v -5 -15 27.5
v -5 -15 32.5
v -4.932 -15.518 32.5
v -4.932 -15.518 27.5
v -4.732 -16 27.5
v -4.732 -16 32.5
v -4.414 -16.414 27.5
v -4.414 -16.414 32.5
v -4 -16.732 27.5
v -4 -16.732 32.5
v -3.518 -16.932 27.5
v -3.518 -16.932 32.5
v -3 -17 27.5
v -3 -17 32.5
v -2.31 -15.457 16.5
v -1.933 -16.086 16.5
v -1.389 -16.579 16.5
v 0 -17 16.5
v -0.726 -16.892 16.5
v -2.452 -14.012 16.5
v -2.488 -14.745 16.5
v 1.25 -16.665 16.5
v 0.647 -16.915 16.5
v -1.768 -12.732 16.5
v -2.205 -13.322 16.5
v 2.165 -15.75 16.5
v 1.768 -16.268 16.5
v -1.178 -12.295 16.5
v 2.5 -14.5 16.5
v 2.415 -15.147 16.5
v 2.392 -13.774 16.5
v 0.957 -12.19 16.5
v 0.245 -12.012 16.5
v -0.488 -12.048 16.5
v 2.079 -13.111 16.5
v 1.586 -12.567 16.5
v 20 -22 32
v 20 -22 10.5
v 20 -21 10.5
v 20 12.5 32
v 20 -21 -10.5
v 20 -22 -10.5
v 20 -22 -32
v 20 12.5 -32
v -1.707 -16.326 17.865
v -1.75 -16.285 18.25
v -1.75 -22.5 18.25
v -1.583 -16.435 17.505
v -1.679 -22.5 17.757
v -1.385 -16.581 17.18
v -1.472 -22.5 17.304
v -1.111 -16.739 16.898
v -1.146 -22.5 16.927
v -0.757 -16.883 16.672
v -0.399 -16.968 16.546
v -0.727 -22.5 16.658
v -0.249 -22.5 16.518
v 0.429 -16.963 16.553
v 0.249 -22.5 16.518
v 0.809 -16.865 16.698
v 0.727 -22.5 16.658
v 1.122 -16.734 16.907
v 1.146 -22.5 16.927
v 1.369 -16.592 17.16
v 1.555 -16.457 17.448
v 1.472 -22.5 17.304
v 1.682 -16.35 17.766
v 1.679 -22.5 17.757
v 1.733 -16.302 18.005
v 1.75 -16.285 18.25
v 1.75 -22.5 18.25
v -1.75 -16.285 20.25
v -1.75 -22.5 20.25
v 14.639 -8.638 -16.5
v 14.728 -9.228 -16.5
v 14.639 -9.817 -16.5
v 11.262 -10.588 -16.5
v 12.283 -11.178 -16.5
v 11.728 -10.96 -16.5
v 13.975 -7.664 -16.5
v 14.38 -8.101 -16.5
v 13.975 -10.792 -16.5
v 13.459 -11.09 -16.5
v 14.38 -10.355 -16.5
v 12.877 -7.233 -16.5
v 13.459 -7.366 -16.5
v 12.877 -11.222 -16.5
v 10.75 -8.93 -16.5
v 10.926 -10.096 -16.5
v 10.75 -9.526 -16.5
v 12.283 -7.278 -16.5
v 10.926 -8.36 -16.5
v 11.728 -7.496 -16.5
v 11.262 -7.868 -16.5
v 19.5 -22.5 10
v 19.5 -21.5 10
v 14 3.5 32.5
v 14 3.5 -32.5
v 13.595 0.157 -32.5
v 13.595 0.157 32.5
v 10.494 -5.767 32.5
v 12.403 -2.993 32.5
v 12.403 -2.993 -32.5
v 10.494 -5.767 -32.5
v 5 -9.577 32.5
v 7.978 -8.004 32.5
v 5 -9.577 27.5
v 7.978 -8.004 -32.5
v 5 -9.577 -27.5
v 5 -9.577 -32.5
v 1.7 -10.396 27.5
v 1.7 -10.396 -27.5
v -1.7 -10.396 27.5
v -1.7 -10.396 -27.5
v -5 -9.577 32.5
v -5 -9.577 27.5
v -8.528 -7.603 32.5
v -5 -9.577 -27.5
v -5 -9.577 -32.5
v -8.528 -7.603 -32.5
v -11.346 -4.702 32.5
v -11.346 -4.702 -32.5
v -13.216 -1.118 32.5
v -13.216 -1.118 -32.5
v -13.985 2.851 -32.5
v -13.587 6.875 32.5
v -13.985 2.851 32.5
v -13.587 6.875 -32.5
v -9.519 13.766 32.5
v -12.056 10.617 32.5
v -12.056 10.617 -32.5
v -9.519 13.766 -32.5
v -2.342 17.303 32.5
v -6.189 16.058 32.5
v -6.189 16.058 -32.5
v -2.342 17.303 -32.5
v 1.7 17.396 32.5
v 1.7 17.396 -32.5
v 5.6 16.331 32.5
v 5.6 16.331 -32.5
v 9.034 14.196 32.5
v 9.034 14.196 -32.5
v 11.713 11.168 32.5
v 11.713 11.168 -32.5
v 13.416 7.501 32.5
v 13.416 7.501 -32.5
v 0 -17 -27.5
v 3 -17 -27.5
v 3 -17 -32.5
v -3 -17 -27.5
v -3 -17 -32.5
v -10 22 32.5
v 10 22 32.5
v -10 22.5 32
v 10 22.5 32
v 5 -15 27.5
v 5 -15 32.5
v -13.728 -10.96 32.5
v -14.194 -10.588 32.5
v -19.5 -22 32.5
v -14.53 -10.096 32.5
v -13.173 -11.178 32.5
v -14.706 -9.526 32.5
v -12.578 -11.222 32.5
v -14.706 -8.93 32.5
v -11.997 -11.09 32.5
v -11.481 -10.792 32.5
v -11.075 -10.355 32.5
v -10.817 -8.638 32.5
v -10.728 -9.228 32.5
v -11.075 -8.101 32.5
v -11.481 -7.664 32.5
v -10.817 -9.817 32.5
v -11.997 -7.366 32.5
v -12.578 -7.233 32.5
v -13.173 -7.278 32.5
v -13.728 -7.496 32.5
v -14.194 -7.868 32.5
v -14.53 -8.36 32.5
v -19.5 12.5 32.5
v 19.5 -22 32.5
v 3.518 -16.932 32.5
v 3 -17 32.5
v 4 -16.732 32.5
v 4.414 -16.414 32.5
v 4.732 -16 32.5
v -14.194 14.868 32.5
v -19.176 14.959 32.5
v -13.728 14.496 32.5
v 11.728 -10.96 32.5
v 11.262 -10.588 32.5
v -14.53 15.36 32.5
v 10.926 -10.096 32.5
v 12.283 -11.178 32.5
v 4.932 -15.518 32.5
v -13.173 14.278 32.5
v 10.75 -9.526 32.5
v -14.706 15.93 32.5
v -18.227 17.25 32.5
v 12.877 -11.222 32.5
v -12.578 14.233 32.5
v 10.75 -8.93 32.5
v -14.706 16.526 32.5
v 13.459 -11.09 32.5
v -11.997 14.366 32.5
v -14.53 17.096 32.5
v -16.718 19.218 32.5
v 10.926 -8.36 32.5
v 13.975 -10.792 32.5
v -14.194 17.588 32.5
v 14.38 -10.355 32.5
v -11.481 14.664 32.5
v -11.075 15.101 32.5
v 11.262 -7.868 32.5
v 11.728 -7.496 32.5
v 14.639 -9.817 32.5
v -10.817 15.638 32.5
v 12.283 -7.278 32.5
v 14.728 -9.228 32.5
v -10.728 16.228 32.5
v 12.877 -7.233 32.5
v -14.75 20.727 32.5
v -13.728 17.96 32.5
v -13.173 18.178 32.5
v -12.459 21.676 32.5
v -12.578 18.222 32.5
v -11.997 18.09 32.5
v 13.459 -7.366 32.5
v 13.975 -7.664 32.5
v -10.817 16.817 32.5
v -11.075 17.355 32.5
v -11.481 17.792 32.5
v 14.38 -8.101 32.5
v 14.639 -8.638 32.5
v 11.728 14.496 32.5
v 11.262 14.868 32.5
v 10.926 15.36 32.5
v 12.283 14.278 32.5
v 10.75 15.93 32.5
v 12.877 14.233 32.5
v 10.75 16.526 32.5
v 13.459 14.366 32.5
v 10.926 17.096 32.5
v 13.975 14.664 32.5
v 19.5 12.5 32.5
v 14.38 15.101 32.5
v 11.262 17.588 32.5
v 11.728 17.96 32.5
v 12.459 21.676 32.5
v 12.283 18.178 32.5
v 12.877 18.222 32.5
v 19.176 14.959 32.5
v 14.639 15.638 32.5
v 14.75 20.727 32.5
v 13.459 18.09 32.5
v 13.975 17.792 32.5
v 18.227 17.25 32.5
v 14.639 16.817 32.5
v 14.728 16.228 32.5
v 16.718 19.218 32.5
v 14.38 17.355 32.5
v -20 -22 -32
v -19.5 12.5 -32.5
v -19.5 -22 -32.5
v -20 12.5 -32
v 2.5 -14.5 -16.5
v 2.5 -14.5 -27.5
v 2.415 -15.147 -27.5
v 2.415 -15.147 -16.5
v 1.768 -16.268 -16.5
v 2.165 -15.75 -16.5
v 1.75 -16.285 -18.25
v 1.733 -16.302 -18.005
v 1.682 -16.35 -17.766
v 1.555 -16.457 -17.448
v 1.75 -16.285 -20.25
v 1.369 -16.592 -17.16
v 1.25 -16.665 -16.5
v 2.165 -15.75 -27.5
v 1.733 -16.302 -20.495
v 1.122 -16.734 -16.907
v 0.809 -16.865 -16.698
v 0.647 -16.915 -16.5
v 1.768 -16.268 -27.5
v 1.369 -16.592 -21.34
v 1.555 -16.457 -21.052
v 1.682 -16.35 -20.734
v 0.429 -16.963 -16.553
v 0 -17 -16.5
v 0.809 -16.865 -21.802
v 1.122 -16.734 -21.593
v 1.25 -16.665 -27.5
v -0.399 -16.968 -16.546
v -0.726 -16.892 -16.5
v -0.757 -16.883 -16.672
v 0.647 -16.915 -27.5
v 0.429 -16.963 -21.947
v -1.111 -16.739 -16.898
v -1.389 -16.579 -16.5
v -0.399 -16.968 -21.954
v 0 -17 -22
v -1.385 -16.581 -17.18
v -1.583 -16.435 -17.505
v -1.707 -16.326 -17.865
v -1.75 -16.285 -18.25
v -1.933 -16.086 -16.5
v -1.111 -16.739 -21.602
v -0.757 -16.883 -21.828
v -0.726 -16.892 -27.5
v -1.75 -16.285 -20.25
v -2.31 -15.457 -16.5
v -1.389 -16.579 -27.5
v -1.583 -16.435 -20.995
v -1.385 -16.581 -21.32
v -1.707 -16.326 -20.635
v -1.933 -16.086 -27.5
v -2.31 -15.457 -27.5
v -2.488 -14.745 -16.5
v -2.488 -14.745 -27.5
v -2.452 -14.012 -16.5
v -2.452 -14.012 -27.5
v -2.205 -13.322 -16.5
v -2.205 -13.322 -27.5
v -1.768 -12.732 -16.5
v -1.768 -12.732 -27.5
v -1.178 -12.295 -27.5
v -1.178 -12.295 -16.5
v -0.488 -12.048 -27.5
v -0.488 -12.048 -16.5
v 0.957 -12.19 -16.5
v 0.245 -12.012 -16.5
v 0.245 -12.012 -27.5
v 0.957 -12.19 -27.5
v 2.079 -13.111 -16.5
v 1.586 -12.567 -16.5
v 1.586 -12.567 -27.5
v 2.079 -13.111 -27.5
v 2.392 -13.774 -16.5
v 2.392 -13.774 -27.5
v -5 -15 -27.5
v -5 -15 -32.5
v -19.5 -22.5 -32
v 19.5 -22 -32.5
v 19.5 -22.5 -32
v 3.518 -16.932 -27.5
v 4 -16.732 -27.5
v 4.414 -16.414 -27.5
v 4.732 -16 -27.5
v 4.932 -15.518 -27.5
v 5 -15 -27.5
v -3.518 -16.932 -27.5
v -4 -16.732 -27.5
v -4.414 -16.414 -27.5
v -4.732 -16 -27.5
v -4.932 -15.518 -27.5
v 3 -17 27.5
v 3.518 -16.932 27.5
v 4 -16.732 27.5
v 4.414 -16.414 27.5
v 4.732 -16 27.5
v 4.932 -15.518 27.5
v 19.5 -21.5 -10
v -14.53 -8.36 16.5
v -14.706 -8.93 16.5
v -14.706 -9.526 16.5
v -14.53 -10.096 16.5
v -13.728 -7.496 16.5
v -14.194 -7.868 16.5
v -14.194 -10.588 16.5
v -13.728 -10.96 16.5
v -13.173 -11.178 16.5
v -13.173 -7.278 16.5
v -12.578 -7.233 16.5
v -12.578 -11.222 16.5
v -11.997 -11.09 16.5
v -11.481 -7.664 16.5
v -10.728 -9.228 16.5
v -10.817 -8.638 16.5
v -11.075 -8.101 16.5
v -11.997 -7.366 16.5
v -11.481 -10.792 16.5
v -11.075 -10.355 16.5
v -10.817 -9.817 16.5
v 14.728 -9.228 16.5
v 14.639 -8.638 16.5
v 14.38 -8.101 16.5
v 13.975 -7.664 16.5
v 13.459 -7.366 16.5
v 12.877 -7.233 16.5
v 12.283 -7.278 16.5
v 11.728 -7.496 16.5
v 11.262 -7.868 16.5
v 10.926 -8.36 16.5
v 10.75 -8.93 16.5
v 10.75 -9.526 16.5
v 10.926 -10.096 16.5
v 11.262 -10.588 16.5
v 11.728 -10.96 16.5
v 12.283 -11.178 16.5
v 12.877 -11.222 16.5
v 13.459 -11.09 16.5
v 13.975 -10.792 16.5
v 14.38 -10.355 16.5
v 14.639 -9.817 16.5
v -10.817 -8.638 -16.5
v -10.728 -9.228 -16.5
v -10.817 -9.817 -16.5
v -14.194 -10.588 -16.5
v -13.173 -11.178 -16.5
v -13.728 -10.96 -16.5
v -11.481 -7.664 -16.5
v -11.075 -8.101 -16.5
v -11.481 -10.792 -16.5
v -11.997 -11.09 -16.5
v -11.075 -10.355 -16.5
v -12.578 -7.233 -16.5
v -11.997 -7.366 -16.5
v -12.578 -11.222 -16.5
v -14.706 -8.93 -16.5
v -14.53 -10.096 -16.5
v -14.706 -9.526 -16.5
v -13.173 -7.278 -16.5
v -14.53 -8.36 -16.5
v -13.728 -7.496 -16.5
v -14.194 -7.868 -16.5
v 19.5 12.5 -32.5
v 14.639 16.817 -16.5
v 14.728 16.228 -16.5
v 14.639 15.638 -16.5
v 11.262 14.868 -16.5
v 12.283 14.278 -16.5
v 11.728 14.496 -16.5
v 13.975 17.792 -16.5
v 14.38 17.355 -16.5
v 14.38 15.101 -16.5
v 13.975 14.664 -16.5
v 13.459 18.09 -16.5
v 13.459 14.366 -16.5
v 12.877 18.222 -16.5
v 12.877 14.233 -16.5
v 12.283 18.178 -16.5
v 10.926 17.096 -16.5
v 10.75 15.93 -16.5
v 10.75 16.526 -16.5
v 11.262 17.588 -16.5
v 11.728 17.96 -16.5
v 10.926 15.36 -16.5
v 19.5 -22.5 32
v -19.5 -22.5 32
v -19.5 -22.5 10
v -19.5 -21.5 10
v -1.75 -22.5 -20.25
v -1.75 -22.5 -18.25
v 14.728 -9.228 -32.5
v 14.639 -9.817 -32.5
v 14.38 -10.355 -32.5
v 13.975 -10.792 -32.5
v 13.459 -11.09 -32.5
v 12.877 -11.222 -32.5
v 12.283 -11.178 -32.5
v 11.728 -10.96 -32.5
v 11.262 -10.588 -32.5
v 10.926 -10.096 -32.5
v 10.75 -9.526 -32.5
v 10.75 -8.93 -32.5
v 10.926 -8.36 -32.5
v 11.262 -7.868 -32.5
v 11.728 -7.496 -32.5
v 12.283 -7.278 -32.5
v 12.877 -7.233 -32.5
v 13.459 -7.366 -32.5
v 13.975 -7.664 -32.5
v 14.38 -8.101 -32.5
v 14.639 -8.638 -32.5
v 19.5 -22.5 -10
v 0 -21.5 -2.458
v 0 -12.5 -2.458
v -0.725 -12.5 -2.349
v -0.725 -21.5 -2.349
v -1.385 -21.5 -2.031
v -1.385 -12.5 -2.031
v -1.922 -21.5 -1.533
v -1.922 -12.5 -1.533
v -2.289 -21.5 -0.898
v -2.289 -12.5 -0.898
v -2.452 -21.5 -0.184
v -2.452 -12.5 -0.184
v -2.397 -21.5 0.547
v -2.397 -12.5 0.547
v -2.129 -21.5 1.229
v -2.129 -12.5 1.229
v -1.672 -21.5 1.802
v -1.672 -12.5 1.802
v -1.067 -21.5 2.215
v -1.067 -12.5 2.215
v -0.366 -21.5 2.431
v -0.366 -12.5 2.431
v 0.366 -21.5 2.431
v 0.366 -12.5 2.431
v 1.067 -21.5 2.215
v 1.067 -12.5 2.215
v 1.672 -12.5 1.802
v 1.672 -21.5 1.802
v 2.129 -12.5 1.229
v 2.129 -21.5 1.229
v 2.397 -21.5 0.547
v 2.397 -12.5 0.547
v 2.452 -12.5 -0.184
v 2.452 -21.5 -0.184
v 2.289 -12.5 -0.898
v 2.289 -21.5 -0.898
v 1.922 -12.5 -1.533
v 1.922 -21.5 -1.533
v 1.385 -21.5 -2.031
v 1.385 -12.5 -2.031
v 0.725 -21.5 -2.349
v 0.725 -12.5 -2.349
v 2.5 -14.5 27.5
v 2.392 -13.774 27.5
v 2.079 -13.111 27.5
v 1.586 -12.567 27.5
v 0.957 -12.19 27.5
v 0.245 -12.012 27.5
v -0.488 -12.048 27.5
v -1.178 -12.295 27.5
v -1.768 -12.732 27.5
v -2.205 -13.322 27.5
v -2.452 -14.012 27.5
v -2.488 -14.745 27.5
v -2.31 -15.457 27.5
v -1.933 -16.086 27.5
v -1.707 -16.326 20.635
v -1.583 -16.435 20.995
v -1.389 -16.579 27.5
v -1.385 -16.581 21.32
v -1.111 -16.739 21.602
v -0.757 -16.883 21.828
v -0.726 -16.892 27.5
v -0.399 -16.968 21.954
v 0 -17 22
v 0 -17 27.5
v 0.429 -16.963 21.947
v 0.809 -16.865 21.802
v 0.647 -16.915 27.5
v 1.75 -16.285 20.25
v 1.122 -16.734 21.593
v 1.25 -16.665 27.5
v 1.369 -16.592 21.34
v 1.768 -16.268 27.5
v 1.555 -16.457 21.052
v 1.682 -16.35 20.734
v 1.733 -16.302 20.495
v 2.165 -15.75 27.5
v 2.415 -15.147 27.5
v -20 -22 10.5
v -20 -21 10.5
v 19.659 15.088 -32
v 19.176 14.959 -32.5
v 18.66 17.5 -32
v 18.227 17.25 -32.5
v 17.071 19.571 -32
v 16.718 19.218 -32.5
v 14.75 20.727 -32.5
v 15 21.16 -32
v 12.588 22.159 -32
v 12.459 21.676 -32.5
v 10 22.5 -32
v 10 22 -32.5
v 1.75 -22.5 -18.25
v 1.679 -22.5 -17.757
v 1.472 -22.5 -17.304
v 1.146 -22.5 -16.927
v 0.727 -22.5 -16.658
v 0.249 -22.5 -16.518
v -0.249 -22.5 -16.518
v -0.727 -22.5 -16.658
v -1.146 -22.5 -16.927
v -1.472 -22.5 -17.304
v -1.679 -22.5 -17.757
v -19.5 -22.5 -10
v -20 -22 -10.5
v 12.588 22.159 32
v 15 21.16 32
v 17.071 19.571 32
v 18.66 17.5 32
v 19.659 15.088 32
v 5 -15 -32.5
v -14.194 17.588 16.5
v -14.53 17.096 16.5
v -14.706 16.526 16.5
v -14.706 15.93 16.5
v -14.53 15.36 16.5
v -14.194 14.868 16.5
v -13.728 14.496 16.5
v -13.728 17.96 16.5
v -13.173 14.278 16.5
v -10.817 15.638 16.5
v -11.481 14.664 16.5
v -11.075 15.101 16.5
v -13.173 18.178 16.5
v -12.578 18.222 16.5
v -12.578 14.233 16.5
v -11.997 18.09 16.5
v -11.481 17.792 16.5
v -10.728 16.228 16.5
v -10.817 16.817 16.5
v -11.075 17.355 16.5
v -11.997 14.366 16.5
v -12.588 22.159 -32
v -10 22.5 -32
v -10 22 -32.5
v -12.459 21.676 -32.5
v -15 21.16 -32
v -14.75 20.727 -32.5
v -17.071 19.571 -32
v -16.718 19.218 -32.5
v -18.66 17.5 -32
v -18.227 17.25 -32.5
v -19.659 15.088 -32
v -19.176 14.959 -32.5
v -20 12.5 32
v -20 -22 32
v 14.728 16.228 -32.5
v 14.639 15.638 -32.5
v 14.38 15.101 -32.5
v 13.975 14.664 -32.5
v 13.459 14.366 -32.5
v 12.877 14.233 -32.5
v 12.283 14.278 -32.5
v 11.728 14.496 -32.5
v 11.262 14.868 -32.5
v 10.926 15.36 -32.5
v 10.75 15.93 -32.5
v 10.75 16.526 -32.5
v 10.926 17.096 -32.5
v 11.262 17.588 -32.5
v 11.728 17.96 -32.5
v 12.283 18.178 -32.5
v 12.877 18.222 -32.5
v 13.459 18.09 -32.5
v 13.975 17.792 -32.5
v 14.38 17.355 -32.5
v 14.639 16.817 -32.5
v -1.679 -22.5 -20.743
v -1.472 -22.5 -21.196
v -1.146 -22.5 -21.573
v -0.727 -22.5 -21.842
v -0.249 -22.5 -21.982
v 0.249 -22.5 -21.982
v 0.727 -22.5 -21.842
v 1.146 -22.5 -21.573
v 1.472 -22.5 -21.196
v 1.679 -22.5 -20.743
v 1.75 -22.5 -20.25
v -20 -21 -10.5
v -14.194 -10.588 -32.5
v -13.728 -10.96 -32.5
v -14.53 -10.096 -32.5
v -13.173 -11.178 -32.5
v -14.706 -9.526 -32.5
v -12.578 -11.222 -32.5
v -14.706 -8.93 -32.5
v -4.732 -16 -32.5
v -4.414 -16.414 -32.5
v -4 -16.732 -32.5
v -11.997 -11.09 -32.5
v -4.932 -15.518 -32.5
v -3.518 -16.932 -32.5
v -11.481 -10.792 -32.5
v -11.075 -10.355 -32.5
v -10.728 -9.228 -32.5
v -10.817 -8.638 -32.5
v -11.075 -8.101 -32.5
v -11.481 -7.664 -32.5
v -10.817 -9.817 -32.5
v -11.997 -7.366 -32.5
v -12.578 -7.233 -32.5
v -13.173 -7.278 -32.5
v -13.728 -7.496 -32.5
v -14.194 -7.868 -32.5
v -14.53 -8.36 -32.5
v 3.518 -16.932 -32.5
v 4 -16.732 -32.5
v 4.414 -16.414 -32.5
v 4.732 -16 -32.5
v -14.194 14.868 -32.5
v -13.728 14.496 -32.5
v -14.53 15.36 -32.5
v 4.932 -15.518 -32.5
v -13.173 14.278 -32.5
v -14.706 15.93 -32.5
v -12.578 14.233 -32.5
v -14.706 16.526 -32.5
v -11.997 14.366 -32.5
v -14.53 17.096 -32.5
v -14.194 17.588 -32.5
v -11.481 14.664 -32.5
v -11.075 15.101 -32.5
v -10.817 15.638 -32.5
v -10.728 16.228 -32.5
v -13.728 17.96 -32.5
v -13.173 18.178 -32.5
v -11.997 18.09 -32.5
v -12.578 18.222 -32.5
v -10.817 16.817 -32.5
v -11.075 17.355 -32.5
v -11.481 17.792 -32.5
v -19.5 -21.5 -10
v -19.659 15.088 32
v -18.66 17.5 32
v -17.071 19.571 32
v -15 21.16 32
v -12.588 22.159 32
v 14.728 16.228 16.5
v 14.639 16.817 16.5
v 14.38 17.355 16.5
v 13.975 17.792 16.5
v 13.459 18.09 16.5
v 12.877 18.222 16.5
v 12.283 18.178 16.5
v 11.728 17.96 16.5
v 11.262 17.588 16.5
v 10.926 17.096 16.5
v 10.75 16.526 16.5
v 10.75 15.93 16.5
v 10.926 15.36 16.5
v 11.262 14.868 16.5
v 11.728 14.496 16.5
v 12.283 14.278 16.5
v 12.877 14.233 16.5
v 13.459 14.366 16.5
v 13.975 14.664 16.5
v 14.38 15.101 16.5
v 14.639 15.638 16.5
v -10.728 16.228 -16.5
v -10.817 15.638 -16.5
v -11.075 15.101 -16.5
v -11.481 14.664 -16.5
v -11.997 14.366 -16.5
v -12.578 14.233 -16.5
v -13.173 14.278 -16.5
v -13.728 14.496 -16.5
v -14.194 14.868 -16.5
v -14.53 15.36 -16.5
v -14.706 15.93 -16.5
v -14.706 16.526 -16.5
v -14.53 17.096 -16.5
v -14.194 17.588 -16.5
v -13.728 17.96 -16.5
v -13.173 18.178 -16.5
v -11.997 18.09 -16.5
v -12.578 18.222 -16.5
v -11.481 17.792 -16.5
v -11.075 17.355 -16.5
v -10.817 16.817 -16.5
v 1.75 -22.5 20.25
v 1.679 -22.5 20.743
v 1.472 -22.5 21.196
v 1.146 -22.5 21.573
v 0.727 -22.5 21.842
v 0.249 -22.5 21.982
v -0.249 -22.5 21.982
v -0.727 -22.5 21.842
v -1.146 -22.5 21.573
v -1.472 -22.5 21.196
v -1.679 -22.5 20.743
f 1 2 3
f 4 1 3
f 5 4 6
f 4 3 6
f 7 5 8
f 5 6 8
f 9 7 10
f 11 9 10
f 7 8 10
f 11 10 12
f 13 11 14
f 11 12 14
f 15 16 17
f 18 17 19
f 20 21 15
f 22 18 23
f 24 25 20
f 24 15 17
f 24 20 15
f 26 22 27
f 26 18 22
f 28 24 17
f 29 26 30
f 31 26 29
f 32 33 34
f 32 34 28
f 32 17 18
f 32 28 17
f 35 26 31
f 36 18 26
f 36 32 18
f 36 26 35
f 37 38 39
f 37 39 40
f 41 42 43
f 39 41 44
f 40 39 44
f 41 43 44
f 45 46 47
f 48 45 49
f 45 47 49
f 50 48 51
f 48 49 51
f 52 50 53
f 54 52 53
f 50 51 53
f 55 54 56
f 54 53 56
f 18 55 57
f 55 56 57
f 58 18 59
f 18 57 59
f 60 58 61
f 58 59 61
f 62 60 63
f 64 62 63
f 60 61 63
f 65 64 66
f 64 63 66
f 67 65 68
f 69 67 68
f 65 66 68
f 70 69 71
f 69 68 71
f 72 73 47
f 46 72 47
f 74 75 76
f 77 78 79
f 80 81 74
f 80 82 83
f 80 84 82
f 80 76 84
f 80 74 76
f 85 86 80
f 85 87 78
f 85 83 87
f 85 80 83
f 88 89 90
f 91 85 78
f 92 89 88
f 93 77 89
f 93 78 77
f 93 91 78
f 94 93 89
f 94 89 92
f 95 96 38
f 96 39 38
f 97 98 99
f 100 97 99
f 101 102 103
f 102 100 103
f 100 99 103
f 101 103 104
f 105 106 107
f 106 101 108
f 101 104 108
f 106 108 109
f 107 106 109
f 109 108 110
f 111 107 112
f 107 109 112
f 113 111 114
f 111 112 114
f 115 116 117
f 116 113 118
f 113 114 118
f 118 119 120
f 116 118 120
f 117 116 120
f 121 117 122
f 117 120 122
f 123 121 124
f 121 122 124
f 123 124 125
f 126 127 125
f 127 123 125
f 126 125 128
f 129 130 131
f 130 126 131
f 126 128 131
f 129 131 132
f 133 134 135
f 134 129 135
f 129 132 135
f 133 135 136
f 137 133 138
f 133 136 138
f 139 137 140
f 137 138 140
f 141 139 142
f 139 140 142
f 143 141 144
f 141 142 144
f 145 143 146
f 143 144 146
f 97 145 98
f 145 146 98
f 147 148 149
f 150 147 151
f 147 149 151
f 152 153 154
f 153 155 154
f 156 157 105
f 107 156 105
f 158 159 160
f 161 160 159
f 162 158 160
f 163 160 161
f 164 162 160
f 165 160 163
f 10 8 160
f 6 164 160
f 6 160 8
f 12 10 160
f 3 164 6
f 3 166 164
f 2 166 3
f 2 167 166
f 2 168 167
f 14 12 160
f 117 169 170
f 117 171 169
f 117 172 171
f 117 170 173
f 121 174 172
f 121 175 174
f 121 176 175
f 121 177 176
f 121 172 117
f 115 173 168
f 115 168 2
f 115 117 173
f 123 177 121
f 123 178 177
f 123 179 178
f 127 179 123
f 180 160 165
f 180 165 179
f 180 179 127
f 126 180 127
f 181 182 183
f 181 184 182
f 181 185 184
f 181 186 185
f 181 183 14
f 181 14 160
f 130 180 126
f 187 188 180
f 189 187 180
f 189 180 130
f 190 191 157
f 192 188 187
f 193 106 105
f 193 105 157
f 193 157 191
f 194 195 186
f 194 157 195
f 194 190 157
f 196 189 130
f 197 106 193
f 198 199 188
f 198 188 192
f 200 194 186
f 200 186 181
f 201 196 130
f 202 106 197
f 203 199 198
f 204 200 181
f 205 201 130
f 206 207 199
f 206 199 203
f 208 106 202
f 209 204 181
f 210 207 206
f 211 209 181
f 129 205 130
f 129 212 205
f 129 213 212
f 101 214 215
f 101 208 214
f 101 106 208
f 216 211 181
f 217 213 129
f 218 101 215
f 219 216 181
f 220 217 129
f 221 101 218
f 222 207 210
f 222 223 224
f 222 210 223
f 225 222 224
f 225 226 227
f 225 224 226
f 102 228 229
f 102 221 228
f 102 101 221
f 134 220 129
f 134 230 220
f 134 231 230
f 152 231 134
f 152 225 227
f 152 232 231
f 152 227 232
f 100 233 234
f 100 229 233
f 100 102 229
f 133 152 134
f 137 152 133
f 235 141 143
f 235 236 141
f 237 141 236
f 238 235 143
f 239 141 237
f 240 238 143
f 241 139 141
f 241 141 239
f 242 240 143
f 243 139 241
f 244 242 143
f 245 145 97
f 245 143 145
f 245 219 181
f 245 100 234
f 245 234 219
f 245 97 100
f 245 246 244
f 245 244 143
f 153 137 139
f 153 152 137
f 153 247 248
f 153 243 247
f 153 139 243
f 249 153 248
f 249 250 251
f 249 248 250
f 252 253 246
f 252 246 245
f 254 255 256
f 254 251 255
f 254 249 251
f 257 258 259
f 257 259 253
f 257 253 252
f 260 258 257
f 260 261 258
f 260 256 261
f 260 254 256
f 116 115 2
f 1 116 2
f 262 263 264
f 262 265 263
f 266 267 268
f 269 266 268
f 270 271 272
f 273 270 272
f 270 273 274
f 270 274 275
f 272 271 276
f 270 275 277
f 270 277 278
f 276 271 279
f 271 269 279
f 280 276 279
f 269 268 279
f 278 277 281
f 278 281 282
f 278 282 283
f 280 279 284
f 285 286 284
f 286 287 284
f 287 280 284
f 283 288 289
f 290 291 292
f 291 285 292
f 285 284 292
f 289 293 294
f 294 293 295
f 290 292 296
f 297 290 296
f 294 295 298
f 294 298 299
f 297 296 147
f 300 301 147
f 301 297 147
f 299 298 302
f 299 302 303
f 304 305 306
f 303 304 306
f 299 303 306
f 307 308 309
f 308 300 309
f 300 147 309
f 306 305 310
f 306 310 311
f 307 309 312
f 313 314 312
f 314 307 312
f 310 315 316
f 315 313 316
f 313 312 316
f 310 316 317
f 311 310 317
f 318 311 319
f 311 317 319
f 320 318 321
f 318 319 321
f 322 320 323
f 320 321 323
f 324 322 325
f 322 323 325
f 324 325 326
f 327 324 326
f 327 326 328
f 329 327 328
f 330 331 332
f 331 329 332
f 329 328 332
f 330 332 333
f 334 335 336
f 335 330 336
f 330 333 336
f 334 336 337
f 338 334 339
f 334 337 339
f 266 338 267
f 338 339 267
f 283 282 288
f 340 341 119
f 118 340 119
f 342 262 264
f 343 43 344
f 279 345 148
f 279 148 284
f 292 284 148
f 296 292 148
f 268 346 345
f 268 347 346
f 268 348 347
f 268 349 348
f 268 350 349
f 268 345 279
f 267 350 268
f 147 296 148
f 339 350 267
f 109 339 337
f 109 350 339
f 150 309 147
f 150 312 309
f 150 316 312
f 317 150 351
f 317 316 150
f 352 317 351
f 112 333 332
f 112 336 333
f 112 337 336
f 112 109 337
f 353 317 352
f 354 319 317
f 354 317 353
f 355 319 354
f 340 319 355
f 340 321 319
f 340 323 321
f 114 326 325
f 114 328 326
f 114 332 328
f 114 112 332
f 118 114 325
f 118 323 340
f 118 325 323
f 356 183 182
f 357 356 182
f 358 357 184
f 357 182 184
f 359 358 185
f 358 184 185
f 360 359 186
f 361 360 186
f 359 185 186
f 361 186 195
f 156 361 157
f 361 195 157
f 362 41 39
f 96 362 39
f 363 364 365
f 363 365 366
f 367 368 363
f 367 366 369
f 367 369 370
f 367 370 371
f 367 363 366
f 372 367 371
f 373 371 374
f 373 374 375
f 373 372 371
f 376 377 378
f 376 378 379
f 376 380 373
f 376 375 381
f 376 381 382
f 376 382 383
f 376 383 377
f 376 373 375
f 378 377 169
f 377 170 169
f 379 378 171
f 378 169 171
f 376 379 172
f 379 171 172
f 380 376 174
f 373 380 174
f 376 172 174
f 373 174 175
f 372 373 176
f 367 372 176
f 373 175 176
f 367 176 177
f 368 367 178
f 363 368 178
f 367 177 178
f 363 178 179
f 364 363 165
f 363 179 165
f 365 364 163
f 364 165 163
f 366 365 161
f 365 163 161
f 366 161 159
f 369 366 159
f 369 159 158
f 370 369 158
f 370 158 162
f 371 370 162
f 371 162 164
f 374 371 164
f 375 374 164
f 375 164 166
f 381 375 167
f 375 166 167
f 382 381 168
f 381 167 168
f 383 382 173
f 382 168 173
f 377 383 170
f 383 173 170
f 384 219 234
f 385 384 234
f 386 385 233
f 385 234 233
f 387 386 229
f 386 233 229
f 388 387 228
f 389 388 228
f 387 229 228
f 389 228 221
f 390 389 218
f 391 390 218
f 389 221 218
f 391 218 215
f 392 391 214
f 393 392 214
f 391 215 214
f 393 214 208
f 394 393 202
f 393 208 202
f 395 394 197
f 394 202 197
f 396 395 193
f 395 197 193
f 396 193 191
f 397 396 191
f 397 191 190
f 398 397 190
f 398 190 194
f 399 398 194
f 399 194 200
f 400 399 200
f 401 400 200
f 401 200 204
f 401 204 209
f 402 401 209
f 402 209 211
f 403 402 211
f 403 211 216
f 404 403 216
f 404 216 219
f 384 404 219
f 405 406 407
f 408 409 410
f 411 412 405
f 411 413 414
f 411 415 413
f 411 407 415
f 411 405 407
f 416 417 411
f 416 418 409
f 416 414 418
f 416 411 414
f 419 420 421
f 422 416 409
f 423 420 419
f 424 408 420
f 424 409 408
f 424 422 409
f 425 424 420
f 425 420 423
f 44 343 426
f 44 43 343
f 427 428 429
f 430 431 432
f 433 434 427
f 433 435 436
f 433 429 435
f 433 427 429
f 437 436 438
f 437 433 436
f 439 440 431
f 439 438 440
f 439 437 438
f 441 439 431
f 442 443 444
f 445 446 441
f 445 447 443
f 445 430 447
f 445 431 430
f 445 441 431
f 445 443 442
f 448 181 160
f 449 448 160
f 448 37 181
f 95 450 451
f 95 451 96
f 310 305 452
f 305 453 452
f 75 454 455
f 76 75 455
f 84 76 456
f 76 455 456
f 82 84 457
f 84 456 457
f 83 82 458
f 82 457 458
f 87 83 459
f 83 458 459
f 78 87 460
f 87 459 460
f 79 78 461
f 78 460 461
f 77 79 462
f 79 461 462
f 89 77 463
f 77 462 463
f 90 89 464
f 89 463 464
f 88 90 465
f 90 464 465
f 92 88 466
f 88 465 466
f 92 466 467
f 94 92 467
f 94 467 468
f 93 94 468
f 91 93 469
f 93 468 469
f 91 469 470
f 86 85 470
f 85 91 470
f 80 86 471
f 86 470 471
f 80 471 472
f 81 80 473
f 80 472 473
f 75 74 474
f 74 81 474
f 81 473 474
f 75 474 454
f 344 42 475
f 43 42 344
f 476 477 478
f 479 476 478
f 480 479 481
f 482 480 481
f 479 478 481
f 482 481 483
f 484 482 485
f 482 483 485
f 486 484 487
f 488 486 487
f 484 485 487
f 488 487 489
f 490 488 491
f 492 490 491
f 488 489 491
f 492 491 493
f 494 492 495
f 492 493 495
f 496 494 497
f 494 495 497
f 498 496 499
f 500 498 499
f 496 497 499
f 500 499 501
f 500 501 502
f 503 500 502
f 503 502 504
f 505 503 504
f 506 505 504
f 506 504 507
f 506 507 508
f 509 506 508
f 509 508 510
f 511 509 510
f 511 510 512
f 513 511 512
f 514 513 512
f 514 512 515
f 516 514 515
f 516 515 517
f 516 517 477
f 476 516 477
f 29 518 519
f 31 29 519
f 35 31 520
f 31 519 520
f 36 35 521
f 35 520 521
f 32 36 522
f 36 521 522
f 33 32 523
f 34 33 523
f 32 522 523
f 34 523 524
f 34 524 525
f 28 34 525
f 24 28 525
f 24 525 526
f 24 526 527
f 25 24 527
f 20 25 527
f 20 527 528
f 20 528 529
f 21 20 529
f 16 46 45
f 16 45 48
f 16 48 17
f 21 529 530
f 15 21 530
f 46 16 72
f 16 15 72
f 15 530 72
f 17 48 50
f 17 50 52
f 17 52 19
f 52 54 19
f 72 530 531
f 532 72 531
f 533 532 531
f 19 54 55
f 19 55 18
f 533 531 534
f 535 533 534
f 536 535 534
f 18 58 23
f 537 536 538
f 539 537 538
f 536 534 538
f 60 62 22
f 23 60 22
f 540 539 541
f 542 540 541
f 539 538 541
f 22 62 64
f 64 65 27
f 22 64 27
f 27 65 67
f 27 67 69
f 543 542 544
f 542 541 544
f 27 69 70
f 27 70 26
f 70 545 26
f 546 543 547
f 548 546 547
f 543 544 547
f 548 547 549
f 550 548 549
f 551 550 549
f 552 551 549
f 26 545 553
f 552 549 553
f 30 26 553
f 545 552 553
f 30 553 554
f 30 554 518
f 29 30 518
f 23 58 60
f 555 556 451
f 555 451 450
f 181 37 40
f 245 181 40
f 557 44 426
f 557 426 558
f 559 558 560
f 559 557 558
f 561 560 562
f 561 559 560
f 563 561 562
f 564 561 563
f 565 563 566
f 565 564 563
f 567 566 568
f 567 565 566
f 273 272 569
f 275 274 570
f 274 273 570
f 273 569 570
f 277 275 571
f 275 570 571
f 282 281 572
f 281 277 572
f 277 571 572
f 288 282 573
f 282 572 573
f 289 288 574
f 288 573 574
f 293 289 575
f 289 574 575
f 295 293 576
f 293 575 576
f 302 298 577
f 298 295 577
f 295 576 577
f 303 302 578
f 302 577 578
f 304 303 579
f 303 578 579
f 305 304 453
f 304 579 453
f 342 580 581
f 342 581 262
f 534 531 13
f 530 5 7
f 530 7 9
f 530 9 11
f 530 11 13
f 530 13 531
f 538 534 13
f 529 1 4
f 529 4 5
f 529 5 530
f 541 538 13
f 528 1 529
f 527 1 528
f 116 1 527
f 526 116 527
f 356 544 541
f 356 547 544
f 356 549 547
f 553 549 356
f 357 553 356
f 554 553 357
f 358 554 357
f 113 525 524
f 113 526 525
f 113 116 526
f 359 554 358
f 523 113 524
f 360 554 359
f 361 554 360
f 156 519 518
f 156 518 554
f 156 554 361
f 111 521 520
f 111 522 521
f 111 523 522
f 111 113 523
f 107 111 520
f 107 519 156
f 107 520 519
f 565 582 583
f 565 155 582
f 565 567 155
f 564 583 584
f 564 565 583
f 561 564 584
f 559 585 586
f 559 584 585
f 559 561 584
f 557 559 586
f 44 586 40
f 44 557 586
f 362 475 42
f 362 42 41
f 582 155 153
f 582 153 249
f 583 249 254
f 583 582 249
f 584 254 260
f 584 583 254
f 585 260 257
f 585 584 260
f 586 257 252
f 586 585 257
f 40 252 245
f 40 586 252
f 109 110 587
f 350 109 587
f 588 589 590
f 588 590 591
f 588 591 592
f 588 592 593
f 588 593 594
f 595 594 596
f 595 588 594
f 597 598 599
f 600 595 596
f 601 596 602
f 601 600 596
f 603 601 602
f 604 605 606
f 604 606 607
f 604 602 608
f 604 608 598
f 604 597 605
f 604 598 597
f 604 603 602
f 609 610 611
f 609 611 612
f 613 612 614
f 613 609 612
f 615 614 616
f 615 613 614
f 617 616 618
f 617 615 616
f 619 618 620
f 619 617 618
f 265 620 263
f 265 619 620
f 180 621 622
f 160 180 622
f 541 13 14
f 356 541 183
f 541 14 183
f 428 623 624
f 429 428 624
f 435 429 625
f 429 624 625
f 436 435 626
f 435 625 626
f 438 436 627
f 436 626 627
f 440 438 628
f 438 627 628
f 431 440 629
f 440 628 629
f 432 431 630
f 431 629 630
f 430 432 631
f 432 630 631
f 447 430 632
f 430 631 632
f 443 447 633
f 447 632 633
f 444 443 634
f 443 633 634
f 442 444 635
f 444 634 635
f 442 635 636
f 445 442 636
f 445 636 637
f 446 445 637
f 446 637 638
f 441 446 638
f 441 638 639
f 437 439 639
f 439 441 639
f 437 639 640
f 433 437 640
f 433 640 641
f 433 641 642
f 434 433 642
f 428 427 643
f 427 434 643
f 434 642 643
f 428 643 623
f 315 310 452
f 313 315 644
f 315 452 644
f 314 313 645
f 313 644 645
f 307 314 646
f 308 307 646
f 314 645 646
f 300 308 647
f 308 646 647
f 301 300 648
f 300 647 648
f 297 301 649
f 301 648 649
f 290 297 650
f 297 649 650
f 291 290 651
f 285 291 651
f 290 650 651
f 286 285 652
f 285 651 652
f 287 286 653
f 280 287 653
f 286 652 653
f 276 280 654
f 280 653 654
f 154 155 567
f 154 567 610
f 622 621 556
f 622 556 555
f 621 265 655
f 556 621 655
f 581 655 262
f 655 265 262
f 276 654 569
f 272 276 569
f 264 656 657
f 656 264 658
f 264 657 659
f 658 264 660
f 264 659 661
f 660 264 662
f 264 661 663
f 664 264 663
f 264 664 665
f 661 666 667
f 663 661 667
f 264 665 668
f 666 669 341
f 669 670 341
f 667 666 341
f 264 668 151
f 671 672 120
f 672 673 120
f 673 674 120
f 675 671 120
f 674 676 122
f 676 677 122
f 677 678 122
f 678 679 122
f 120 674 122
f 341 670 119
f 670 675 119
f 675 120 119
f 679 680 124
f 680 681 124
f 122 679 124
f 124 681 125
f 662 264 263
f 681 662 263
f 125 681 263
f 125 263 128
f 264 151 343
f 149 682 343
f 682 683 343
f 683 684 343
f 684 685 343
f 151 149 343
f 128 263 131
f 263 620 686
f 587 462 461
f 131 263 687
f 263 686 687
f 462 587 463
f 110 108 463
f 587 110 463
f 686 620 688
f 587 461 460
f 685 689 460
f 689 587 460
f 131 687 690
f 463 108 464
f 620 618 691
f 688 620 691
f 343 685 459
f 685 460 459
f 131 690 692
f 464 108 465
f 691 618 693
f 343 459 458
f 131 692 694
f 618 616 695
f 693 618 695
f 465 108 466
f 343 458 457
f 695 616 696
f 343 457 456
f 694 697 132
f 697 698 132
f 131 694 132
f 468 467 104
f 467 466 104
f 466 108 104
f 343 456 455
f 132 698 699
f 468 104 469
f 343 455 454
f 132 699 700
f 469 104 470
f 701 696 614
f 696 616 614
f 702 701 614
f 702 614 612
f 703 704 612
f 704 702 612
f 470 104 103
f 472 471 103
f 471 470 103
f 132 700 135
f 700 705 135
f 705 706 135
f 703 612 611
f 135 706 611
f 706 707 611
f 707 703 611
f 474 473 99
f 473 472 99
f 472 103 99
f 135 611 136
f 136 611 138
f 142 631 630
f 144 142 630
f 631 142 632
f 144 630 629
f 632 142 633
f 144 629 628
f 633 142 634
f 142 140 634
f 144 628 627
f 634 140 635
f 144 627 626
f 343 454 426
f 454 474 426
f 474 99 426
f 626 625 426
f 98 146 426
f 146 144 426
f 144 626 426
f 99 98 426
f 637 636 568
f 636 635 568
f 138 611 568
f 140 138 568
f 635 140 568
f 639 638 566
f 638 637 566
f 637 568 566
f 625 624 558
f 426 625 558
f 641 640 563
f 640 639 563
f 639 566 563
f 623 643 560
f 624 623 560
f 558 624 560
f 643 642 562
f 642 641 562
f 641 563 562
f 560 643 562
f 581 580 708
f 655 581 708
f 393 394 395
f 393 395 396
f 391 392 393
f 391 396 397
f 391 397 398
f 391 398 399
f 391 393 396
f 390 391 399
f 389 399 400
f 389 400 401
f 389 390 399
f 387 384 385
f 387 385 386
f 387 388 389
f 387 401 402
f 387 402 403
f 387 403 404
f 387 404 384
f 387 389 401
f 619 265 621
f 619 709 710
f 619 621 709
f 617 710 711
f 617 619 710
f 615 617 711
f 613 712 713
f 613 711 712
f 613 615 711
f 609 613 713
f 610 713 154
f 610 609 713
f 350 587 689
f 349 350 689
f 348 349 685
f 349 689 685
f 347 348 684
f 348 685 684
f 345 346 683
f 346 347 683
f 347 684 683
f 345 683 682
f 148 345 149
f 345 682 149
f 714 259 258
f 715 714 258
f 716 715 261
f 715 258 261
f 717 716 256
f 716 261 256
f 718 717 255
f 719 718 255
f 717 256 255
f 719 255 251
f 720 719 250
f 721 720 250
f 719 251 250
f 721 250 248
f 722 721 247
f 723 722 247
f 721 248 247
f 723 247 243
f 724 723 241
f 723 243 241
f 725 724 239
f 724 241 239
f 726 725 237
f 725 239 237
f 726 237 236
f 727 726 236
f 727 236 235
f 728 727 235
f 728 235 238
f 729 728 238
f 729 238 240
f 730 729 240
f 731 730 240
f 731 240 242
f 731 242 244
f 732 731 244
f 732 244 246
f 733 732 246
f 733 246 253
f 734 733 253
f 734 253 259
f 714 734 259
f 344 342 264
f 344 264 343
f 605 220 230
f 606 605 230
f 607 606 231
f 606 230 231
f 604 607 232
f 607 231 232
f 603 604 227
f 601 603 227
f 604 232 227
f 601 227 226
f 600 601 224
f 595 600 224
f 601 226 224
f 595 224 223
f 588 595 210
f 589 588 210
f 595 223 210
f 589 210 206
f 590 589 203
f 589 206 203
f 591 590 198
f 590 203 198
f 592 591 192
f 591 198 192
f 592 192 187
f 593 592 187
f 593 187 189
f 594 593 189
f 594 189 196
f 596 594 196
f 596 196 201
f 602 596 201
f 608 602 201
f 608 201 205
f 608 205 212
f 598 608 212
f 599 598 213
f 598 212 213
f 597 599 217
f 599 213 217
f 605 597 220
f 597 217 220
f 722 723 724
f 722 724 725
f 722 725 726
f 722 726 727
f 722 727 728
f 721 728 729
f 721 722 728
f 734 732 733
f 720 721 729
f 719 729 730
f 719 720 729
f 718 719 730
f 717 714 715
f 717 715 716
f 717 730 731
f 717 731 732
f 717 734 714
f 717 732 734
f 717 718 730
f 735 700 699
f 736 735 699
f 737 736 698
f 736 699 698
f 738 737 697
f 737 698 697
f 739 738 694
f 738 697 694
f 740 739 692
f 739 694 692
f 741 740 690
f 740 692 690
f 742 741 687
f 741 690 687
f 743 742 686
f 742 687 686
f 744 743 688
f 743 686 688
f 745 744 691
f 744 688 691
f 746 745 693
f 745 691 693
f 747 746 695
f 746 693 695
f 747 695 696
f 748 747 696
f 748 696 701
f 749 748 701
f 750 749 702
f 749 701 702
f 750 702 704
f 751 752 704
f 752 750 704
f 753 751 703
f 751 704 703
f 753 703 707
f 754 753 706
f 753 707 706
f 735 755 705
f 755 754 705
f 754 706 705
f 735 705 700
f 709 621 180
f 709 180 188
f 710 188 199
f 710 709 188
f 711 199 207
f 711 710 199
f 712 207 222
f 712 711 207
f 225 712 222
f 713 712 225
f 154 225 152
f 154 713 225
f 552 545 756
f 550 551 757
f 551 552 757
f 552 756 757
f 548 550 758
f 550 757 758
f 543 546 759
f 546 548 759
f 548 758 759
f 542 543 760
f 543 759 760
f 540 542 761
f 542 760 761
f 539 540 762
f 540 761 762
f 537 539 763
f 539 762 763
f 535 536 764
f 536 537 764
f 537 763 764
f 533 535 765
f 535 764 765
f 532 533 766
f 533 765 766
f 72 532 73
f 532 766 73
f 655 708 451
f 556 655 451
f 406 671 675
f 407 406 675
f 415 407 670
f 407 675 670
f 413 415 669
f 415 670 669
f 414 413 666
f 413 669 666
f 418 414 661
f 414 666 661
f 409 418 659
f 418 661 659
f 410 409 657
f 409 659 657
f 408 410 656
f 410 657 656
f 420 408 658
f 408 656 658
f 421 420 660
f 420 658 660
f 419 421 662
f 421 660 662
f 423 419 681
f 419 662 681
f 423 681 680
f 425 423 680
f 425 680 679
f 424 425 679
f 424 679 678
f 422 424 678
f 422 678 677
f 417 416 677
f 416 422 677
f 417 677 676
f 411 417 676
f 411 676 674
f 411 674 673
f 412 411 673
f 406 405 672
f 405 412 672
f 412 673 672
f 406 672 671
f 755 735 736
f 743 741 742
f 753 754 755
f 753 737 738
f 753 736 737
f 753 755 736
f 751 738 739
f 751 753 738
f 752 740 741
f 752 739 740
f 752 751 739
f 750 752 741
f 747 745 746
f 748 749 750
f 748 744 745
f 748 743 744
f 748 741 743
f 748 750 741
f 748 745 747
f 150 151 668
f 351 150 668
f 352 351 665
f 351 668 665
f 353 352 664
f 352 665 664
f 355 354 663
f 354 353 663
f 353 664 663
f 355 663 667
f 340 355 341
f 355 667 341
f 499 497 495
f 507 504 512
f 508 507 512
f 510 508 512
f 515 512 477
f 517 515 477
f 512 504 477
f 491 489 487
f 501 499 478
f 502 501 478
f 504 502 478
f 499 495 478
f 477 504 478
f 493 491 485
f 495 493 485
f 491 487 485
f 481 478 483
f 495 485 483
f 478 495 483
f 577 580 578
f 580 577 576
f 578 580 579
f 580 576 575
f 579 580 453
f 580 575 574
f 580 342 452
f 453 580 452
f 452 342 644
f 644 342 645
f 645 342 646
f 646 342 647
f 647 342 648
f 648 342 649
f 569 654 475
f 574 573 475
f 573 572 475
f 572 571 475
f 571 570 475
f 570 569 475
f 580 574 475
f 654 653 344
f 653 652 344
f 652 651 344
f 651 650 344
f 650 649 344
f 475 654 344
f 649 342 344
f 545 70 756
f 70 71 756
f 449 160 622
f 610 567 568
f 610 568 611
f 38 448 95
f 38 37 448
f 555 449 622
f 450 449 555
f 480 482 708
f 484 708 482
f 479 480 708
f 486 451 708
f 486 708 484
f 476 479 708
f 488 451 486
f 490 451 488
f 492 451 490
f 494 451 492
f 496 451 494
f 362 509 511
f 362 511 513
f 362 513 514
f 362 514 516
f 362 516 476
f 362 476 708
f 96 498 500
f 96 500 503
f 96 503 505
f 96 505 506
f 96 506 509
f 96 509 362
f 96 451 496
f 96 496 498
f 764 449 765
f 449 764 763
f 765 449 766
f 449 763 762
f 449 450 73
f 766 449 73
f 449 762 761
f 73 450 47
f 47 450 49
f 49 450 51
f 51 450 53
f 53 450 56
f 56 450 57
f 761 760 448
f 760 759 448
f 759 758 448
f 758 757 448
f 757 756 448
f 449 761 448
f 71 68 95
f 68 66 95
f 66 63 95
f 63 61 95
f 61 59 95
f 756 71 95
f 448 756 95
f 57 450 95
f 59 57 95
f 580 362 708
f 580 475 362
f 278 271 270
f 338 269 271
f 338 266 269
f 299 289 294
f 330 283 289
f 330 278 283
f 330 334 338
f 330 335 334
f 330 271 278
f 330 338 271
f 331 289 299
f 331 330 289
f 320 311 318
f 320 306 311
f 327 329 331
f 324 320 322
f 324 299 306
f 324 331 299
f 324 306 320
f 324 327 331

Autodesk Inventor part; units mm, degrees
ref_plane "YZ Plane" through (0, 0, 0) normal (1, 0, 0) x (0, 1, 0)
ref_plane "XZ Plane" through (0, 0, 0) normal (0, 1, 0) x (-1, 0, 0)
ref_plane "XY Plane" through (0, 0, 0) normal (0, 0, 1) x (1, 0, 0)
sketch "Skizze1" plane through (0, 0, 0) normal (0, 0, 1) x (1, 0, 0)
  circle A0 centre (0, 3.5) radius 14
  line L0 (-20, -22.5) -> (20, -22.5)
  line L1 (20, -22.5) -> (20, 12.5)
  line L2 (10, 22.5) -> (-10, 22.5)
  line L3 (-20, 12.5) -> (-20, -22.5)
  arc A1 (-10, 22.5) -> (-20, 12.5) centre (-10, 12.5) ccw
  arc A2 (20, 12.5) -> (10, 22.5) centre (10, 12.5) ccw
  dimension "d0" = 28
  dimension "d3" = 10
  dimension "d13" = 19
extrude "Extrusion1" add sketch "Skizze1" along normal mid plane 65
sketch "Skizze2" plane through (0, 0, 32.5) normal (0, 0, 1) x (1, 0, 0)
  circle A0 centre (0, 3.5) radius 18 construction
  circle A1 centre (0, -14.5) radius 2.5
  line L0 (-18, -14.5) -> (18, -14.5)
  line L1 (18, -14.5) -> (18, 21.5)
  line L2 (18, 21.5) -> (-18, 21.5)
  line L3 (-18, 21.5) -> (-18, -14.5)
  line L4 (-18, -14.5) -> (18, 21.5) construction
  line L5 (18, -14.5) -> (-18, 21.5) construction
  circle A2 centre (12.7279, 16.2279) radius 2
  circle A3 centre (12.7279, -9.2279) radius 2
  circle A4 centre (-12.7279, -9.2279) radius 2
  circle A5 centre (-12.7279, 16.2279) radius 2
  circle A6 centre (0, 3.5) radius 14
  dimension "d6" = 36
  dimension "d7" = 5
  dimension "d8" = 4
  dimension "d9" = 4
  dimension "d10" = 4
  dimension "d11" = 4
extrude "Extrusion2" cut sketch "Skizze2" against normal blind 16 contours L0 A1 | A1 L0 | A2 | A3 | A4 | A5
sketch "Skizze3" plane through (0, 0, 32.5) normal (0, 0, 1) x (1, 0, 0)
  line L0 (-3, -17) -> (3, -17)
  line L1 (5, -15) -> (5, -12)
  line L2 (5, -12) -> (-5, -12)
  line L3 (-5, -12) -> (-5, -15)
  circle A0 centre (0, -14.5) radius 2.5 projected
  line L4 (-5, -17) -> (5, -12) construction
  line L5 (5, -17) -> (-5, -12) construction
  circle A1 centre (0, 3.5) radius 14 projected
  line L6 (-5, -12) -> (5, -12)
  line L7 (5, -12) -> (5, -9.5767)
  line L8 (5, -9.5767) -> (-5, -9.5767)
  line L9 (-5, -9.5767) -> (-5, -12)
  arc A2 (-5, -15) -> (-3, -17) centre (-3, -15) ccw
  arc A3 (3, -17) -> (5, -15) centre (3, -15) ccw
  point P0 (0, 0)
  dimension "d16" = 10
  dimension "d17" = 2
extrude "Extrusion3" cut sketch "Skizze3" against normal blind 5 contours A2 L3 L2 A0 L0 | A0 L2 L1 A3 L0 | A0 | L2 L9 A1 L7
sketch "Skizze4" plane through (-20, -22.5, 32.5) normal (0, -1, 0) x (1, 0, 0)
  line L0 (17.5, -16) -> (22.5, -16) projected
  line L1 (17.5, -5) -> (17.5, -16) projected
  line L2 (22.5, -5) -> (22.5, -16) projected
  line L3 (17.5, -16) -> (22.5, -16)
  line L4 (22.5, -16) -> (22.5, -10.5)
  line L5 (22.5, -10.5) -> (17.5, -10.5)
  line L6 (17.5, -10.5) -> (17.5, -16)
  line L7 (20, -16) -> (20, -10.5) construction
  line L8 (21.75, -14.25) -> (21.75, -12.25)
  line L9 (18.25, -12.25) -> (18.25, -14.25)
  arc A0 (18.25, -14.25) -> (21.75, -14.25) centre (20, -14.25) ccw
  arc A1 (21.75, -12.25) -> (18.25, -12.25) centre (20, -12.25) ccw
  point P0 (20, -32.5)
  point P1 (20, -13.25)
  dimension "d20" = 5.5
  dimension "d21" = 3.5
extrude "Extrusion4" cut sketch "Skizze4" against normal up to surface contours A0 L9 A1 L8
sketch "Skizze5" plane through (-20, -22.5, 32.5) normal (0, -1, 0) x (1, 0, 0)
  line L0 (40, 0) -> (40, -65) projected
  line L1 (0, -22.5) -> (40, -22.5)
  line L2 (40, -22.5) -> (40, -42.5)
  line L3 (40, -42.5) -> (0, -42.5)
  line L4 (0, -42.5) -> (0, -22.5)
  line L5 (0, -22.5) -> (40, -42.5) construction
  line L6 (40, -22.5) -> (0, -42.5) construction
  point P0 (20, -32.5)
  dimension "d24" = 20
extrude "Extrusion5" cut sketch "Skizze5" against normal blind 1
sketch "Skizze6" plane through (-20, -21.5, 32.5) normal (0, -1, 0) x (1, 0, 0)
  point P0 (20, -32.5)
hole "Bohrung1" at (0, -21.5, 0) direction (0, 1, 0) diameter 4.917 depth 9 thread size "M6x1" class "6H" standard "ISO Metric profile"
ref_plane "Arbeitsebene1" through (0, 0, 0) normal (0, 0, 1) x (1, 0, 0)
mirror "Spiegeln1" about plane through (0, 0, 0) normal (0, 0, 1) of "Extrusion3", "Extrusion2", "Extrusion4"
chamfer "Fasen1" distance 0.5 angle 45 22 edges at (20, -5, 32.5) (17.0711, 19.5711, 32.5) (0, 22.5, 32.5) (-17.0711, 19.5711, 32.5) (-20, -5, 32.5) (20, -22.5, 21.25) (20, -21.5, 0) (20, -22.5, -21.25) (0, -22.5, 32.5) (-20, -22.5, 21.25) (-20, -22.5, -21.25) (17.0711, 19.5711, -32.5) (20, -5, -32.5) (0, 22.5, -32.5) (-17.0711, 19.5711, -32.5) (-20, -5, -32.5) (-20, -21.5, 0) (-20, -22, 10) (-20, -22, -10) (20, -22, -10) (20, -22, 10) (0, -22.5, -32.5)
properties part number "sf_Cylinder_1"
